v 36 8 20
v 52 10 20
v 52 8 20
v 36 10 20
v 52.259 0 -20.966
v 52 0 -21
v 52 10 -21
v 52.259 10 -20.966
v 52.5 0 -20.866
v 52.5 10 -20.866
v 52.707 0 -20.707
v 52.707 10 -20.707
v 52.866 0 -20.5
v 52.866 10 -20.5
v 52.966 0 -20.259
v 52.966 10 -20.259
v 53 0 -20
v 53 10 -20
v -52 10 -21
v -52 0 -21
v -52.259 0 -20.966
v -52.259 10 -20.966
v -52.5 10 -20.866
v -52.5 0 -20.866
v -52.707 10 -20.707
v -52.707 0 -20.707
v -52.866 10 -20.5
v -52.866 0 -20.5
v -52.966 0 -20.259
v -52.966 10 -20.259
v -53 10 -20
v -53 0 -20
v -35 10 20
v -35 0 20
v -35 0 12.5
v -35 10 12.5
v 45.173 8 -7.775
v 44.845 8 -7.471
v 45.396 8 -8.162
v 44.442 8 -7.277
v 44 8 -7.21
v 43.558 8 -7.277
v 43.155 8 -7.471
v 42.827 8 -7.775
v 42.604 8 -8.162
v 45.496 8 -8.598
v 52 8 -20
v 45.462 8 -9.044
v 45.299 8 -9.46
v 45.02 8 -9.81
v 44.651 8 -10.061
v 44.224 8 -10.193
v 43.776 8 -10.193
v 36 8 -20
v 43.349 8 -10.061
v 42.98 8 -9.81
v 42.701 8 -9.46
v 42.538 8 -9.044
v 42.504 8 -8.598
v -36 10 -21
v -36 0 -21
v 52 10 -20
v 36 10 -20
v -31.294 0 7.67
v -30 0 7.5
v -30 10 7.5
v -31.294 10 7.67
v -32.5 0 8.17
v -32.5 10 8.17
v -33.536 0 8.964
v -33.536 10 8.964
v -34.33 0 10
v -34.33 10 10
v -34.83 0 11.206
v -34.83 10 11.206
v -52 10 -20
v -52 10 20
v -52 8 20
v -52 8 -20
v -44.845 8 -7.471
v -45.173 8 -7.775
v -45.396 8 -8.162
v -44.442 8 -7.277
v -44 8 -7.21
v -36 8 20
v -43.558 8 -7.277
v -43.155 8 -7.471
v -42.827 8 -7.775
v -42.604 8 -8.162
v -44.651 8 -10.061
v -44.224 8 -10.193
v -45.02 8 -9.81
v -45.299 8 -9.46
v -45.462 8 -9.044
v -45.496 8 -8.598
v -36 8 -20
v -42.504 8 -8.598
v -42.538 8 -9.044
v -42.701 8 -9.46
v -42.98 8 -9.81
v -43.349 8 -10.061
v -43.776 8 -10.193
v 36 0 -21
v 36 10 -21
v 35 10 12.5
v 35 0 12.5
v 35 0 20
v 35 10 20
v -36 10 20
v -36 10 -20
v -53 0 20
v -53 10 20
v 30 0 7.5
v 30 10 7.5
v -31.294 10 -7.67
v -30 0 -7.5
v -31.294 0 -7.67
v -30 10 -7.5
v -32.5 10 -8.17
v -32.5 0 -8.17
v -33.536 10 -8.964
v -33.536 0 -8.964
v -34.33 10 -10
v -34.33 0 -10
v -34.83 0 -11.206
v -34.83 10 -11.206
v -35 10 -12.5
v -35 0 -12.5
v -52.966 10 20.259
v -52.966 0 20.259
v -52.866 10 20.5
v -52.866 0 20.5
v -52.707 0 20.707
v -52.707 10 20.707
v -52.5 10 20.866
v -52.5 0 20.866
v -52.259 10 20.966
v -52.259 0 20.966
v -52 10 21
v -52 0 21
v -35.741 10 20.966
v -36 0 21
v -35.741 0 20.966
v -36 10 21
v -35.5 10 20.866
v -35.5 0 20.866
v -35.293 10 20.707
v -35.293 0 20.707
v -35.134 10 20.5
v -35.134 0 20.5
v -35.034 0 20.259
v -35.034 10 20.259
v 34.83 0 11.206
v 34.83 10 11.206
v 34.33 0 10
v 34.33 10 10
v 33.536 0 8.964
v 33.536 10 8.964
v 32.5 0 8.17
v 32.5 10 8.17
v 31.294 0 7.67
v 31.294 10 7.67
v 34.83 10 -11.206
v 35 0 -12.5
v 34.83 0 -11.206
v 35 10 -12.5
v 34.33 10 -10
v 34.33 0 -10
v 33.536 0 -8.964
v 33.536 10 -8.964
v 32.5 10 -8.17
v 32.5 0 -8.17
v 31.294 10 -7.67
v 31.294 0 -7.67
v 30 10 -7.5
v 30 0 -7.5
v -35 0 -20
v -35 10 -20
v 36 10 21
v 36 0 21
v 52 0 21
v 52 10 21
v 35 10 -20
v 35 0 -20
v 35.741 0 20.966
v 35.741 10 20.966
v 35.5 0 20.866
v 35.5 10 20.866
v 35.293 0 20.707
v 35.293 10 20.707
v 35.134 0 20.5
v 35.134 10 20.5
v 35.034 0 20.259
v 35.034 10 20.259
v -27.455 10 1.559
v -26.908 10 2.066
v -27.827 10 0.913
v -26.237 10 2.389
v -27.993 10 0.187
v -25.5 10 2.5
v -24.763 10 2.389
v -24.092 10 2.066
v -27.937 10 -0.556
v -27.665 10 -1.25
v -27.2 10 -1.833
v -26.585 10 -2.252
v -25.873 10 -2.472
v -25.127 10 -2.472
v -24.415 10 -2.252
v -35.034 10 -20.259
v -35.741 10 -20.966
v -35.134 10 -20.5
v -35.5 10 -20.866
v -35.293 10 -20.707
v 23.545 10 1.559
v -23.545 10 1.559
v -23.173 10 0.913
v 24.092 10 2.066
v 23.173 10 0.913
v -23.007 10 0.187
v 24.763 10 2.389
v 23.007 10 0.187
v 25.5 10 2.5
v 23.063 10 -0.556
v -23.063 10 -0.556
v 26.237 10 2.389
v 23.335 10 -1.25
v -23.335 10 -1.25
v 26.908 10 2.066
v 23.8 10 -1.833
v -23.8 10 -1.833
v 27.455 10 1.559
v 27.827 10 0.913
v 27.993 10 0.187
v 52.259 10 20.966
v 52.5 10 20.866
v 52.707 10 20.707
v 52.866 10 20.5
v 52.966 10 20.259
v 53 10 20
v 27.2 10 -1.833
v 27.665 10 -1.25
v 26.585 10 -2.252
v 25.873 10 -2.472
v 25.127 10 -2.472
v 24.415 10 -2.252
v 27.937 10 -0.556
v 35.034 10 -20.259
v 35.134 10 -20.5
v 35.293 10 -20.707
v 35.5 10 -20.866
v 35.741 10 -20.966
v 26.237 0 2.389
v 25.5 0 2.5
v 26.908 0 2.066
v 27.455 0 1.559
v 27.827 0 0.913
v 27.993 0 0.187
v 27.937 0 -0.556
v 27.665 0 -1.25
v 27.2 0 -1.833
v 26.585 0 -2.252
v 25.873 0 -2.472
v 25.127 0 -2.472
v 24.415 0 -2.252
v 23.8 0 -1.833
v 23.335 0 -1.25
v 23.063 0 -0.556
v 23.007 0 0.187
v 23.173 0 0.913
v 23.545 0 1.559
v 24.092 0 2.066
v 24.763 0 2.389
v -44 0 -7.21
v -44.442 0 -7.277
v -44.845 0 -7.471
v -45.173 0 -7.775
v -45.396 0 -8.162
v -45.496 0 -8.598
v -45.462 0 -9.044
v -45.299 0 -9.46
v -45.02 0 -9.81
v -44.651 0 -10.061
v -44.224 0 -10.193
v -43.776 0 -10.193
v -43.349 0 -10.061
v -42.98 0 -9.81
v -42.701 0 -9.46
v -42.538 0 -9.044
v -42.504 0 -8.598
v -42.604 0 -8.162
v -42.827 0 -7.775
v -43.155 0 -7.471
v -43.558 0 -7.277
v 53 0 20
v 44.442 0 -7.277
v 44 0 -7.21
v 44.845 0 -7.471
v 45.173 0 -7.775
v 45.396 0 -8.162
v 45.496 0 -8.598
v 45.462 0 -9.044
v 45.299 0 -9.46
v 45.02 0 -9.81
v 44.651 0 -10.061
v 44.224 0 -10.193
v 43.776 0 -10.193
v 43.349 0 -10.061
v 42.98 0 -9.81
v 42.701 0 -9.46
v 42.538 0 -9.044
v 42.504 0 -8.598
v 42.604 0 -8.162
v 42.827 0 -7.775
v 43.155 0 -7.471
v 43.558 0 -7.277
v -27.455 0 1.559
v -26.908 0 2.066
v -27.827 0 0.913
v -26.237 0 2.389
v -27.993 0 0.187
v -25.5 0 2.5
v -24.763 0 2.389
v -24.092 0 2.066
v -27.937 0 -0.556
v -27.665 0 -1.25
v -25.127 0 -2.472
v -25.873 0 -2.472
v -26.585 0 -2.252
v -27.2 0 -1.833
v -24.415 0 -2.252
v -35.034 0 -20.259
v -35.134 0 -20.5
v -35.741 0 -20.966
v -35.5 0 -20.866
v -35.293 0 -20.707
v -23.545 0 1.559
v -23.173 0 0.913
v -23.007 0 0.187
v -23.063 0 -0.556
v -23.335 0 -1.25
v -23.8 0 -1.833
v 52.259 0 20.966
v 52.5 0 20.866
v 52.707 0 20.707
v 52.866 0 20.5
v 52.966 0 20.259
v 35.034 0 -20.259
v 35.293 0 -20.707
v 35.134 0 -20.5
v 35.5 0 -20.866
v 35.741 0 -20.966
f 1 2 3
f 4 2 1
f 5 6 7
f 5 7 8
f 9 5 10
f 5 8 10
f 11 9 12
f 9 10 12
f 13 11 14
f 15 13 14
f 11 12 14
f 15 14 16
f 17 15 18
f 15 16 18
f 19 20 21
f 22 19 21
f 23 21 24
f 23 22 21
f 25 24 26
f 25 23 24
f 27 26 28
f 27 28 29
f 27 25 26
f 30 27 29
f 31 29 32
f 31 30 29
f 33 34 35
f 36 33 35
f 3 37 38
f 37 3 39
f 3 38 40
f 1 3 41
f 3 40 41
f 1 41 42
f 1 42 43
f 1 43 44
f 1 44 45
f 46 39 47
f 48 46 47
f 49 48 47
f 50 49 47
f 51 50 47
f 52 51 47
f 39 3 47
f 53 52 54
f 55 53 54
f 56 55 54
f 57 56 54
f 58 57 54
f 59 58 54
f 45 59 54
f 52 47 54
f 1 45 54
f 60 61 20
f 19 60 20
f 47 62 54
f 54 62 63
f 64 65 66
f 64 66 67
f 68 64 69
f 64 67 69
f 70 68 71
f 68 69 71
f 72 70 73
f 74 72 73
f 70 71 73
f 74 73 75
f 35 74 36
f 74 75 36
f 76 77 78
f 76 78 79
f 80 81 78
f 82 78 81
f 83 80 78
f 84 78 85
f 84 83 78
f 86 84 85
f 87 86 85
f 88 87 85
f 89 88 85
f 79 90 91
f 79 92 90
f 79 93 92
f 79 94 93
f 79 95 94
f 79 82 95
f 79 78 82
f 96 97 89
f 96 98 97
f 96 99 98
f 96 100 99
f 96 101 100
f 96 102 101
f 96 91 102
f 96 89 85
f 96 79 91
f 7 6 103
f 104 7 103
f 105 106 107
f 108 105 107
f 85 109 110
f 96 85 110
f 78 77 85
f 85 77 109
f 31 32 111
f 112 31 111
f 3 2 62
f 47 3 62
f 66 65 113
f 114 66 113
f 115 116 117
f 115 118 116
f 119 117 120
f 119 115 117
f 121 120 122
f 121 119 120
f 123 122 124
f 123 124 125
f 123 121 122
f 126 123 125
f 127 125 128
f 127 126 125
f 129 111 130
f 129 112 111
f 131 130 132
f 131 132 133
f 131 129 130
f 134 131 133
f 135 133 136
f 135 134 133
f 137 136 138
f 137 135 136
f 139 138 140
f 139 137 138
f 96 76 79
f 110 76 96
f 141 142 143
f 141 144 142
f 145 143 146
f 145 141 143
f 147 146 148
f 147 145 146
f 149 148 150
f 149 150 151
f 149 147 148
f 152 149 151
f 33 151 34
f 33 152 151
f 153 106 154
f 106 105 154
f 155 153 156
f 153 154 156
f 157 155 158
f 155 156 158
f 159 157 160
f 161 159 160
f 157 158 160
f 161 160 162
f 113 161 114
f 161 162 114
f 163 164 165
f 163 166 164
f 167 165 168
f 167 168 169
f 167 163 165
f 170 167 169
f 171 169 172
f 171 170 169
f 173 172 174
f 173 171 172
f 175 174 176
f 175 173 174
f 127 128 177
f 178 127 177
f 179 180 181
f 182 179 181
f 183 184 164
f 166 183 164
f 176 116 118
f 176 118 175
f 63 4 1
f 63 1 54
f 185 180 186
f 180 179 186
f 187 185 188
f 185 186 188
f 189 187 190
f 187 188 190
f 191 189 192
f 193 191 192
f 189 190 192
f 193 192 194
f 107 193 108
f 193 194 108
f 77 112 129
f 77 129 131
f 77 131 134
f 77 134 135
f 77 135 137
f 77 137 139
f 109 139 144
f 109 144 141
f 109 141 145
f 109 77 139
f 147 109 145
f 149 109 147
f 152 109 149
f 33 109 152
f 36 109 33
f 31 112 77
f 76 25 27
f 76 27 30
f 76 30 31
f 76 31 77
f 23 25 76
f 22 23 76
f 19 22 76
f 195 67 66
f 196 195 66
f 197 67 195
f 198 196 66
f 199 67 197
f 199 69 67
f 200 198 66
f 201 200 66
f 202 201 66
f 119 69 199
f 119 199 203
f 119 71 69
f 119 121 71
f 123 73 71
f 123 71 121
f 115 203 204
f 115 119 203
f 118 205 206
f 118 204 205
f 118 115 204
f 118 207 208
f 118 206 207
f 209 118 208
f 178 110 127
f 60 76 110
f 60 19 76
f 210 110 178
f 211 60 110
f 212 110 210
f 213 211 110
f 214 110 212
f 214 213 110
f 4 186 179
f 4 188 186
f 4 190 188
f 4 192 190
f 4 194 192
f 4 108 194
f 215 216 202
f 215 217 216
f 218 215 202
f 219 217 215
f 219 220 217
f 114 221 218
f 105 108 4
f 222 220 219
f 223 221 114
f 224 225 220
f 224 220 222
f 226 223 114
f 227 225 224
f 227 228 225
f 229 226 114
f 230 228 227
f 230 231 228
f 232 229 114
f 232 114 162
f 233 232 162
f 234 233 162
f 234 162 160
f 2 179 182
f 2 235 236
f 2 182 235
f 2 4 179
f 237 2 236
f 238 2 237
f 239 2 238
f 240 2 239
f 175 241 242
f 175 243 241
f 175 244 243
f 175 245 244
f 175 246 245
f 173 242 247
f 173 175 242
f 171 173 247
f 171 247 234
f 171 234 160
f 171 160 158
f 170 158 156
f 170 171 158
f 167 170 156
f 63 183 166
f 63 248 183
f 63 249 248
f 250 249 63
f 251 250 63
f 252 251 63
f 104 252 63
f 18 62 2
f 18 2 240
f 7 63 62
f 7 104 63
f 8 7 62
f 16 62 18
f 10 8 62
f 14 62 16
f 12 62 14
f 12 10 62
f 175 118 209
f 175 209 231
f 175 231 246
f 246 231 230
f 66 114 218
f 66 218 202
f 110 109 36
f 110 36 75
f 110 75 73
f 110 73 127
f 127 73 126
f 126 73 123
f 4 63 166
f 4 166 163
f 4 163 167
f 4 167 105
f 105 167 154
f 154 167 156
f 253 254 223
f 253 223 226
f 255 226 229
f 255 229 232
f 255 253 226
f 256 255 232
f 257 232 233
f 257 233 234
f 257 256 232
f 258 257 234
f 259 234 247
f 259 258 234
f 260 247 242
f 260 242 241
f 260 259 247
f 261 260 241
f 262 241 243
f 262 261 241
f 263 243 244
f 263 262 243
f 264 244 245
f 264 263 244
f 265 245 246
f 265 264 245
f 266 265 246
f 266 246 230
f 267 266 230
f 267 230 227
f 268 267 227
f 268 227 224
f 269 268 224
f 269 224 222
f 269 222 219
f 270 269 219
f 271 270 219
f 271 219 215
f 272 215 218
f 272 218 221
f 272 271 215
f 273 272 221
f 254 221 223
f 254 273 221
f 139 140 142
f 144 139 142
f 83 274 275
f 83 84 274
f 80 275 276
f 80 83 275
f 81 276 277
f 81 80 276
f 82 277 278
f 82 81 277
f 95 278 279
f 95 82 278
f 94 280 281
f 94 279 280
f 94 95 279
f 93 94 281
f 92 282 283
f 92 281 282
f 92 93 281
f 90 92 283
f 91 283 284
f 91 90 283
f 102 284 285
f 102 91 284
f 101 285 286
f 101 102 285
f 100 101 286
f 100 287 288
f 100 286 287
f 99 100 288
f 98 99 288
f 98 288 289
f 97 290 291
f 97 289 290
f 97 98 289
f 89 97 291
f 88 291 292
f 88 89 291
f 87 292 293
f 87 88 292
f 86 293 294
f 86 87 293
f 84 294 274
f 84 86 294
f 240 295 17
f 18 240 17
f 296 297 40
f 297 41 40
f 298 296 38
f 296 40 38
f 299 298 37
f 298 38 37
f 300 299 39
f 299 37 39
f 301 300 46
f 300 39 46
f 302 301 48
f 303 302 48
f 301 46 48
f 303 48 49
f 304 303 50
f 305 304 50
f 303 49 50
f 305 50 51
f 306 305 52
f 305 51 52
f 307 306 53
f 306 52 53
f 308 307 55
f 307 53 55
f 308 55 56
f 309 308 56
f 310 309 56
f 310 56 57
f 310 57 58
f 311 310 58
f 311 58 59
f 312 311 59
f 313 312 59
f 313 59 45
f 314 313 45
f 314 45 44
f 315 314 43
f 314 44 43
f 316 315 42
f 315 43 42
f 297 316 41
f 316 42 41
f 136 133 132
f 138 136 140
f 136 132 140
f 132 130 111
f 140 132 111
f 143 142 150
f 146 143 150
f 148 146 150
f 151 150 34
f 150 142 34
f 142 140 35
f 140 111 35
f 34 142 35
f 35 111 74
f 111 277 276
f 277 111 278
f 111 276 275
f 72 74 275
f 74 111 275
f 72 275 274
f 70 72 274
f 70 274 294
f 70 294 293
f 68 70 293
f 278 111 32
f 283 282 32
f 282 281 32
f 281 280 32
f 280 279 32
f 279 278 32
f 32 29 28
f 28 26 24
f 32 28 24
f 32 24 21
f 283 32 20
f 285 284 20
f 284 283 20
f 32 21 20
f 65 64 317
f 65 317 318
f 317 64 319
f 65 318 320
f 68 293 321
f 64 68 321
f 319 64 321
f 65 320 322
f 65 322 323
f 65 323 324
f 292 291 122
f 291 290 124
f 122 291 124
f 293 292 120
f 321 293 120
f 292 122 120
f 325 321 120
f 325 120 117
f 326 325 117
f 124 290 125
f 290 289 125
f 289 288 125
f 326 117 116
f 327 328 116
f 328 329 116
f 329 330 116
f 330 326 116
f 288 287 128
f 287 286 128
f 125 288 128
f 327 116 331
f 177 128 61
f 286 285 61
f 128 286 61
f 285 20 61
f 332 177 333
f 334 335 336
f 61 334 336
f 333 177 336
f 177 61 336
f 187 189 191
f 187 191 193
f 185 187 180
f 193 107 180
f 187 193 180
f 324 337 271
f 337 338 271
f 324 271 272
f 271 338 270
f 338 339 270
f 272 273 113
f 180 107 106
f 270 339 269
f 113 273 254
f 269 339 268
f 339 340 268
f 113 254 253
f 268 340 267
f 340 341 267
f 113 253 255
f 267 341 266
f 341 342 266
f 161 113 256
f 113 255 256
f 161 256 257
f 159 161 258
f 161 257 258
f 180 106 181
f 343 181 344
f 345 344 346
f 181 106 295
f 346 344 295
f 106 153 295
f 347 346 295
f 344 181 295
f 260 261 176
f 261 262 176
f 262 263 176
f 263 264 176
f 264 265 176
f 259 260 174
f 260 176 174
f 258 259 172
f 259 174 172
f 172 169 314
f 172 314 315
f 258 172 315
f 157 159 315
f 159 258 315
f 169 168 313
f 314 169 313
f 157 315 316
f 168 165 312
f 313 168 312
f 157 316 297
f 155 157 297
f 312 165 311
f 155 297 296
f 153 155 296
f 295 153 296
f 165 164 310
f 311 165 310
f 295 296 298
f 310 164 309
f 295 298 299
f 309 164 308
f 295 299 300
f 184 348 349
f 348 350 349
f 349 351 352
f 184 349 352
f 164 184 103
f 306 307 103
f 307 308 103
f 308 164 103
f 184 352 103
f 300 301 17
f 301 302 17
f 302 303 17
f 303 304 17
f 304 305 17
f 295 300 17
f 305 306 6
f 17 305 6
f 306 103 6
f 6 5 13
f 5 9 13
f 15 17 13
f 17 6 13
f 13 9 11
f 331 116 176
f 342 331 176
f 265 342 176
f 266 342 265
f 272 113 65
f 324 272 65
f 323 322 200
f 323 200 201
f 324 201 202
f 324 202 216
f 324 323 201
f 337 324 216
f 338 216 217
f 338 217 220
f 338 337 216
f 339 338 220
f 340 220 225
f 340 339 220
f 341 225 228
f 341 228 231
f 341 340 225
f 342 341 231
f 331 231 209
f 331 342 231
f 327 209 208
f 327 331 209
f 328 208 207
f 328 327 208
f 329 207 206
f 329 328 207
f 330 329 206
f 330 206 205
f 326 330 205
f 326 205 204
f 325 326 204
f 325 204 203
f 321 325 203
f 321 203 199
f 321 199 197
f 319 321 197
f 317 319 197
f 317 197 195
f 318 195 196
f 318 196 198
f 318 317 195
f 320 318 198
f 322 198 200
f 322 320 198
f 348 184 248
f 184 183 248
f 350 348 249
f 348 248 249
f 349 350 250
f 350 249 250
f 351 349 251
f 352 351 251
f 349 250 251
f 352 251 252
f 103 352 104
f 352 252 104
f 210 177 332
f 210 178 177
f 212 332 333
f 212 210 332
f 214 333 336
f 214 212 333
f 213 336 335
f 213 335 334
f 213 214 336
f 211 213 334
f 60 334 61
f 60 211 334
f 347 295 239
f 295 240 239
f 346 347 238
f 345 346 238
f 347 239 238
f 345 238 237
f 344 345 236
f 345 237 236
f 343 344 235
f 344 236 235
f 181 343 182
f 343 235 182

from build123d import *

# Parameters (mm, degrees)
SKETCH1_W           = 70
SKETCH1_H           = 15
SKETCH1_R           = 2.5
BOSS_EXTRUDE2_DEPTH = 10
FILLET1_R           = 5
SKETCH4_W           = 16
SKETCH4_H           = 40
CUT_EXTRUDE2_DEPTH  = 2
SKETCH5_R           = 1.5
CUT_EXTRUDE3_DEPTH  = 58.567351858
FILLET2_R           = 1


with BuildPart() as part:
    # Sketch1 → Boss-Extrude2 (new body)
    # profile 1 of 3: a face of its own
    with BuildSketch(Plane(origin=(0, 0, 0), x_dir=(1, 0, 0), z_dir=(0, 1, 0))):
        Polygon((-35, -7.5), (-35, 7.5), (-35, 21), (-53, 21), (-53, -21), (-35, -21), align=None)
    # profile 2 of 3: a face of its own
    with BuildSketch(Plane(origin=(0, 0, 0), x_dir=(1, 0, 0), z_dir=(0, 1, 0))):
        Rectangle(SKETCH1_W, SKETCH1_H)
        with Locations(Location((25.5, 0, 0), (0, 0, 270))):
            Circle(SKETCH1_R, mode=Mode.SUBTRACT)
        with Locations(Location((-25.5, 0, 0), (0, 0, 270))):
            Circle(SKETCH1_R, mode=Mode.SUBTRACT)
    # profile 3 of 3: a face of its own
    with BuildSketch(Plane(origin=(0, 0, 0), x_dir=(1, 0, 0), z_dir=(0, 1, 0))):
        Polygon((35, 21), (35, 7.5), (35, -7.5), (35, -21), (53, -21), (53, 21), align=None)
    extrude(amount=BOSS_EXTRUDE2_DEPTH)

    # Fillet1
    fillet1_edges = [part.edges().sort_by_distance(p)[0] for p in [
        (-35, 5, -7.5),
        (35, 5, -7.5),
        (35, 5, 7.5),
        (-35, 5, 7.5),
    ]]
    fillet(fillet1_edges, radius=FILLET1_R)

    # Sketch4 → Cut-Extrude2 (cut)
    with BuildSketch(Plane(origin=(0, 10, 0), x_dir=(1, 0, 0), z_dir=(0, 1, 0))):
        with Locations((-44, 0)):
            Rectangle(SKETCH4_W, SKETCH4_H)
    cut_extrude2 = extrude(amount=-CUT_EXTRUDE2_DEPTH, mode=Mode.SUBTRACT)

    # Mirror3: Cut-Extrude2 across plane
    add(cut_extrude2.mirror(Plane(origin=(0, 0, 0), x_dir=(0, 0, 1), z_dir=(1, 0, 0))), mode=Mode.SUBTRACT)

    # Sketch5 → Cut-Extrude3 (cut, symmetric)
    with BuildSketch(Plane(origin=(0, 8, 0), x_dir=(1, 0, 0), z_dir=(0, 1, 0))):
        with Locations(Location((44, 8.71, 0), (0, 0, 270))):
            Circle(SKETCH5_R)
    cut_extrude3 = extrude(amount=CUT_EXTRUDE3_DEPTH, both=True, mode=Mode.SUBTRACT)

    # Mirror4: Cut-Extrude3 across plane
    add(cut_extrude3.mirror(Plane(origin=(0, 0, 0), x_dir=(0, 0, 1), z_dir=(1, 0, 0))), mode=Mode.SUBTRACT)

    # Fillet2
    fillet2_edges = [part.edges().sort_by_distance(p)[0] for p in [
        (35, 5, -21),
        (53, 5, -21),
        (53, 5, 21),
        (35, 5, 21),
        (-35, 5, 21),
        (-53, 5, 21),
        (-53, 5, -21),
        (-35, 5, -21),
    ]]
    fillet(fillet2_edges, radius=FILLET2_R)


solid = part.part
